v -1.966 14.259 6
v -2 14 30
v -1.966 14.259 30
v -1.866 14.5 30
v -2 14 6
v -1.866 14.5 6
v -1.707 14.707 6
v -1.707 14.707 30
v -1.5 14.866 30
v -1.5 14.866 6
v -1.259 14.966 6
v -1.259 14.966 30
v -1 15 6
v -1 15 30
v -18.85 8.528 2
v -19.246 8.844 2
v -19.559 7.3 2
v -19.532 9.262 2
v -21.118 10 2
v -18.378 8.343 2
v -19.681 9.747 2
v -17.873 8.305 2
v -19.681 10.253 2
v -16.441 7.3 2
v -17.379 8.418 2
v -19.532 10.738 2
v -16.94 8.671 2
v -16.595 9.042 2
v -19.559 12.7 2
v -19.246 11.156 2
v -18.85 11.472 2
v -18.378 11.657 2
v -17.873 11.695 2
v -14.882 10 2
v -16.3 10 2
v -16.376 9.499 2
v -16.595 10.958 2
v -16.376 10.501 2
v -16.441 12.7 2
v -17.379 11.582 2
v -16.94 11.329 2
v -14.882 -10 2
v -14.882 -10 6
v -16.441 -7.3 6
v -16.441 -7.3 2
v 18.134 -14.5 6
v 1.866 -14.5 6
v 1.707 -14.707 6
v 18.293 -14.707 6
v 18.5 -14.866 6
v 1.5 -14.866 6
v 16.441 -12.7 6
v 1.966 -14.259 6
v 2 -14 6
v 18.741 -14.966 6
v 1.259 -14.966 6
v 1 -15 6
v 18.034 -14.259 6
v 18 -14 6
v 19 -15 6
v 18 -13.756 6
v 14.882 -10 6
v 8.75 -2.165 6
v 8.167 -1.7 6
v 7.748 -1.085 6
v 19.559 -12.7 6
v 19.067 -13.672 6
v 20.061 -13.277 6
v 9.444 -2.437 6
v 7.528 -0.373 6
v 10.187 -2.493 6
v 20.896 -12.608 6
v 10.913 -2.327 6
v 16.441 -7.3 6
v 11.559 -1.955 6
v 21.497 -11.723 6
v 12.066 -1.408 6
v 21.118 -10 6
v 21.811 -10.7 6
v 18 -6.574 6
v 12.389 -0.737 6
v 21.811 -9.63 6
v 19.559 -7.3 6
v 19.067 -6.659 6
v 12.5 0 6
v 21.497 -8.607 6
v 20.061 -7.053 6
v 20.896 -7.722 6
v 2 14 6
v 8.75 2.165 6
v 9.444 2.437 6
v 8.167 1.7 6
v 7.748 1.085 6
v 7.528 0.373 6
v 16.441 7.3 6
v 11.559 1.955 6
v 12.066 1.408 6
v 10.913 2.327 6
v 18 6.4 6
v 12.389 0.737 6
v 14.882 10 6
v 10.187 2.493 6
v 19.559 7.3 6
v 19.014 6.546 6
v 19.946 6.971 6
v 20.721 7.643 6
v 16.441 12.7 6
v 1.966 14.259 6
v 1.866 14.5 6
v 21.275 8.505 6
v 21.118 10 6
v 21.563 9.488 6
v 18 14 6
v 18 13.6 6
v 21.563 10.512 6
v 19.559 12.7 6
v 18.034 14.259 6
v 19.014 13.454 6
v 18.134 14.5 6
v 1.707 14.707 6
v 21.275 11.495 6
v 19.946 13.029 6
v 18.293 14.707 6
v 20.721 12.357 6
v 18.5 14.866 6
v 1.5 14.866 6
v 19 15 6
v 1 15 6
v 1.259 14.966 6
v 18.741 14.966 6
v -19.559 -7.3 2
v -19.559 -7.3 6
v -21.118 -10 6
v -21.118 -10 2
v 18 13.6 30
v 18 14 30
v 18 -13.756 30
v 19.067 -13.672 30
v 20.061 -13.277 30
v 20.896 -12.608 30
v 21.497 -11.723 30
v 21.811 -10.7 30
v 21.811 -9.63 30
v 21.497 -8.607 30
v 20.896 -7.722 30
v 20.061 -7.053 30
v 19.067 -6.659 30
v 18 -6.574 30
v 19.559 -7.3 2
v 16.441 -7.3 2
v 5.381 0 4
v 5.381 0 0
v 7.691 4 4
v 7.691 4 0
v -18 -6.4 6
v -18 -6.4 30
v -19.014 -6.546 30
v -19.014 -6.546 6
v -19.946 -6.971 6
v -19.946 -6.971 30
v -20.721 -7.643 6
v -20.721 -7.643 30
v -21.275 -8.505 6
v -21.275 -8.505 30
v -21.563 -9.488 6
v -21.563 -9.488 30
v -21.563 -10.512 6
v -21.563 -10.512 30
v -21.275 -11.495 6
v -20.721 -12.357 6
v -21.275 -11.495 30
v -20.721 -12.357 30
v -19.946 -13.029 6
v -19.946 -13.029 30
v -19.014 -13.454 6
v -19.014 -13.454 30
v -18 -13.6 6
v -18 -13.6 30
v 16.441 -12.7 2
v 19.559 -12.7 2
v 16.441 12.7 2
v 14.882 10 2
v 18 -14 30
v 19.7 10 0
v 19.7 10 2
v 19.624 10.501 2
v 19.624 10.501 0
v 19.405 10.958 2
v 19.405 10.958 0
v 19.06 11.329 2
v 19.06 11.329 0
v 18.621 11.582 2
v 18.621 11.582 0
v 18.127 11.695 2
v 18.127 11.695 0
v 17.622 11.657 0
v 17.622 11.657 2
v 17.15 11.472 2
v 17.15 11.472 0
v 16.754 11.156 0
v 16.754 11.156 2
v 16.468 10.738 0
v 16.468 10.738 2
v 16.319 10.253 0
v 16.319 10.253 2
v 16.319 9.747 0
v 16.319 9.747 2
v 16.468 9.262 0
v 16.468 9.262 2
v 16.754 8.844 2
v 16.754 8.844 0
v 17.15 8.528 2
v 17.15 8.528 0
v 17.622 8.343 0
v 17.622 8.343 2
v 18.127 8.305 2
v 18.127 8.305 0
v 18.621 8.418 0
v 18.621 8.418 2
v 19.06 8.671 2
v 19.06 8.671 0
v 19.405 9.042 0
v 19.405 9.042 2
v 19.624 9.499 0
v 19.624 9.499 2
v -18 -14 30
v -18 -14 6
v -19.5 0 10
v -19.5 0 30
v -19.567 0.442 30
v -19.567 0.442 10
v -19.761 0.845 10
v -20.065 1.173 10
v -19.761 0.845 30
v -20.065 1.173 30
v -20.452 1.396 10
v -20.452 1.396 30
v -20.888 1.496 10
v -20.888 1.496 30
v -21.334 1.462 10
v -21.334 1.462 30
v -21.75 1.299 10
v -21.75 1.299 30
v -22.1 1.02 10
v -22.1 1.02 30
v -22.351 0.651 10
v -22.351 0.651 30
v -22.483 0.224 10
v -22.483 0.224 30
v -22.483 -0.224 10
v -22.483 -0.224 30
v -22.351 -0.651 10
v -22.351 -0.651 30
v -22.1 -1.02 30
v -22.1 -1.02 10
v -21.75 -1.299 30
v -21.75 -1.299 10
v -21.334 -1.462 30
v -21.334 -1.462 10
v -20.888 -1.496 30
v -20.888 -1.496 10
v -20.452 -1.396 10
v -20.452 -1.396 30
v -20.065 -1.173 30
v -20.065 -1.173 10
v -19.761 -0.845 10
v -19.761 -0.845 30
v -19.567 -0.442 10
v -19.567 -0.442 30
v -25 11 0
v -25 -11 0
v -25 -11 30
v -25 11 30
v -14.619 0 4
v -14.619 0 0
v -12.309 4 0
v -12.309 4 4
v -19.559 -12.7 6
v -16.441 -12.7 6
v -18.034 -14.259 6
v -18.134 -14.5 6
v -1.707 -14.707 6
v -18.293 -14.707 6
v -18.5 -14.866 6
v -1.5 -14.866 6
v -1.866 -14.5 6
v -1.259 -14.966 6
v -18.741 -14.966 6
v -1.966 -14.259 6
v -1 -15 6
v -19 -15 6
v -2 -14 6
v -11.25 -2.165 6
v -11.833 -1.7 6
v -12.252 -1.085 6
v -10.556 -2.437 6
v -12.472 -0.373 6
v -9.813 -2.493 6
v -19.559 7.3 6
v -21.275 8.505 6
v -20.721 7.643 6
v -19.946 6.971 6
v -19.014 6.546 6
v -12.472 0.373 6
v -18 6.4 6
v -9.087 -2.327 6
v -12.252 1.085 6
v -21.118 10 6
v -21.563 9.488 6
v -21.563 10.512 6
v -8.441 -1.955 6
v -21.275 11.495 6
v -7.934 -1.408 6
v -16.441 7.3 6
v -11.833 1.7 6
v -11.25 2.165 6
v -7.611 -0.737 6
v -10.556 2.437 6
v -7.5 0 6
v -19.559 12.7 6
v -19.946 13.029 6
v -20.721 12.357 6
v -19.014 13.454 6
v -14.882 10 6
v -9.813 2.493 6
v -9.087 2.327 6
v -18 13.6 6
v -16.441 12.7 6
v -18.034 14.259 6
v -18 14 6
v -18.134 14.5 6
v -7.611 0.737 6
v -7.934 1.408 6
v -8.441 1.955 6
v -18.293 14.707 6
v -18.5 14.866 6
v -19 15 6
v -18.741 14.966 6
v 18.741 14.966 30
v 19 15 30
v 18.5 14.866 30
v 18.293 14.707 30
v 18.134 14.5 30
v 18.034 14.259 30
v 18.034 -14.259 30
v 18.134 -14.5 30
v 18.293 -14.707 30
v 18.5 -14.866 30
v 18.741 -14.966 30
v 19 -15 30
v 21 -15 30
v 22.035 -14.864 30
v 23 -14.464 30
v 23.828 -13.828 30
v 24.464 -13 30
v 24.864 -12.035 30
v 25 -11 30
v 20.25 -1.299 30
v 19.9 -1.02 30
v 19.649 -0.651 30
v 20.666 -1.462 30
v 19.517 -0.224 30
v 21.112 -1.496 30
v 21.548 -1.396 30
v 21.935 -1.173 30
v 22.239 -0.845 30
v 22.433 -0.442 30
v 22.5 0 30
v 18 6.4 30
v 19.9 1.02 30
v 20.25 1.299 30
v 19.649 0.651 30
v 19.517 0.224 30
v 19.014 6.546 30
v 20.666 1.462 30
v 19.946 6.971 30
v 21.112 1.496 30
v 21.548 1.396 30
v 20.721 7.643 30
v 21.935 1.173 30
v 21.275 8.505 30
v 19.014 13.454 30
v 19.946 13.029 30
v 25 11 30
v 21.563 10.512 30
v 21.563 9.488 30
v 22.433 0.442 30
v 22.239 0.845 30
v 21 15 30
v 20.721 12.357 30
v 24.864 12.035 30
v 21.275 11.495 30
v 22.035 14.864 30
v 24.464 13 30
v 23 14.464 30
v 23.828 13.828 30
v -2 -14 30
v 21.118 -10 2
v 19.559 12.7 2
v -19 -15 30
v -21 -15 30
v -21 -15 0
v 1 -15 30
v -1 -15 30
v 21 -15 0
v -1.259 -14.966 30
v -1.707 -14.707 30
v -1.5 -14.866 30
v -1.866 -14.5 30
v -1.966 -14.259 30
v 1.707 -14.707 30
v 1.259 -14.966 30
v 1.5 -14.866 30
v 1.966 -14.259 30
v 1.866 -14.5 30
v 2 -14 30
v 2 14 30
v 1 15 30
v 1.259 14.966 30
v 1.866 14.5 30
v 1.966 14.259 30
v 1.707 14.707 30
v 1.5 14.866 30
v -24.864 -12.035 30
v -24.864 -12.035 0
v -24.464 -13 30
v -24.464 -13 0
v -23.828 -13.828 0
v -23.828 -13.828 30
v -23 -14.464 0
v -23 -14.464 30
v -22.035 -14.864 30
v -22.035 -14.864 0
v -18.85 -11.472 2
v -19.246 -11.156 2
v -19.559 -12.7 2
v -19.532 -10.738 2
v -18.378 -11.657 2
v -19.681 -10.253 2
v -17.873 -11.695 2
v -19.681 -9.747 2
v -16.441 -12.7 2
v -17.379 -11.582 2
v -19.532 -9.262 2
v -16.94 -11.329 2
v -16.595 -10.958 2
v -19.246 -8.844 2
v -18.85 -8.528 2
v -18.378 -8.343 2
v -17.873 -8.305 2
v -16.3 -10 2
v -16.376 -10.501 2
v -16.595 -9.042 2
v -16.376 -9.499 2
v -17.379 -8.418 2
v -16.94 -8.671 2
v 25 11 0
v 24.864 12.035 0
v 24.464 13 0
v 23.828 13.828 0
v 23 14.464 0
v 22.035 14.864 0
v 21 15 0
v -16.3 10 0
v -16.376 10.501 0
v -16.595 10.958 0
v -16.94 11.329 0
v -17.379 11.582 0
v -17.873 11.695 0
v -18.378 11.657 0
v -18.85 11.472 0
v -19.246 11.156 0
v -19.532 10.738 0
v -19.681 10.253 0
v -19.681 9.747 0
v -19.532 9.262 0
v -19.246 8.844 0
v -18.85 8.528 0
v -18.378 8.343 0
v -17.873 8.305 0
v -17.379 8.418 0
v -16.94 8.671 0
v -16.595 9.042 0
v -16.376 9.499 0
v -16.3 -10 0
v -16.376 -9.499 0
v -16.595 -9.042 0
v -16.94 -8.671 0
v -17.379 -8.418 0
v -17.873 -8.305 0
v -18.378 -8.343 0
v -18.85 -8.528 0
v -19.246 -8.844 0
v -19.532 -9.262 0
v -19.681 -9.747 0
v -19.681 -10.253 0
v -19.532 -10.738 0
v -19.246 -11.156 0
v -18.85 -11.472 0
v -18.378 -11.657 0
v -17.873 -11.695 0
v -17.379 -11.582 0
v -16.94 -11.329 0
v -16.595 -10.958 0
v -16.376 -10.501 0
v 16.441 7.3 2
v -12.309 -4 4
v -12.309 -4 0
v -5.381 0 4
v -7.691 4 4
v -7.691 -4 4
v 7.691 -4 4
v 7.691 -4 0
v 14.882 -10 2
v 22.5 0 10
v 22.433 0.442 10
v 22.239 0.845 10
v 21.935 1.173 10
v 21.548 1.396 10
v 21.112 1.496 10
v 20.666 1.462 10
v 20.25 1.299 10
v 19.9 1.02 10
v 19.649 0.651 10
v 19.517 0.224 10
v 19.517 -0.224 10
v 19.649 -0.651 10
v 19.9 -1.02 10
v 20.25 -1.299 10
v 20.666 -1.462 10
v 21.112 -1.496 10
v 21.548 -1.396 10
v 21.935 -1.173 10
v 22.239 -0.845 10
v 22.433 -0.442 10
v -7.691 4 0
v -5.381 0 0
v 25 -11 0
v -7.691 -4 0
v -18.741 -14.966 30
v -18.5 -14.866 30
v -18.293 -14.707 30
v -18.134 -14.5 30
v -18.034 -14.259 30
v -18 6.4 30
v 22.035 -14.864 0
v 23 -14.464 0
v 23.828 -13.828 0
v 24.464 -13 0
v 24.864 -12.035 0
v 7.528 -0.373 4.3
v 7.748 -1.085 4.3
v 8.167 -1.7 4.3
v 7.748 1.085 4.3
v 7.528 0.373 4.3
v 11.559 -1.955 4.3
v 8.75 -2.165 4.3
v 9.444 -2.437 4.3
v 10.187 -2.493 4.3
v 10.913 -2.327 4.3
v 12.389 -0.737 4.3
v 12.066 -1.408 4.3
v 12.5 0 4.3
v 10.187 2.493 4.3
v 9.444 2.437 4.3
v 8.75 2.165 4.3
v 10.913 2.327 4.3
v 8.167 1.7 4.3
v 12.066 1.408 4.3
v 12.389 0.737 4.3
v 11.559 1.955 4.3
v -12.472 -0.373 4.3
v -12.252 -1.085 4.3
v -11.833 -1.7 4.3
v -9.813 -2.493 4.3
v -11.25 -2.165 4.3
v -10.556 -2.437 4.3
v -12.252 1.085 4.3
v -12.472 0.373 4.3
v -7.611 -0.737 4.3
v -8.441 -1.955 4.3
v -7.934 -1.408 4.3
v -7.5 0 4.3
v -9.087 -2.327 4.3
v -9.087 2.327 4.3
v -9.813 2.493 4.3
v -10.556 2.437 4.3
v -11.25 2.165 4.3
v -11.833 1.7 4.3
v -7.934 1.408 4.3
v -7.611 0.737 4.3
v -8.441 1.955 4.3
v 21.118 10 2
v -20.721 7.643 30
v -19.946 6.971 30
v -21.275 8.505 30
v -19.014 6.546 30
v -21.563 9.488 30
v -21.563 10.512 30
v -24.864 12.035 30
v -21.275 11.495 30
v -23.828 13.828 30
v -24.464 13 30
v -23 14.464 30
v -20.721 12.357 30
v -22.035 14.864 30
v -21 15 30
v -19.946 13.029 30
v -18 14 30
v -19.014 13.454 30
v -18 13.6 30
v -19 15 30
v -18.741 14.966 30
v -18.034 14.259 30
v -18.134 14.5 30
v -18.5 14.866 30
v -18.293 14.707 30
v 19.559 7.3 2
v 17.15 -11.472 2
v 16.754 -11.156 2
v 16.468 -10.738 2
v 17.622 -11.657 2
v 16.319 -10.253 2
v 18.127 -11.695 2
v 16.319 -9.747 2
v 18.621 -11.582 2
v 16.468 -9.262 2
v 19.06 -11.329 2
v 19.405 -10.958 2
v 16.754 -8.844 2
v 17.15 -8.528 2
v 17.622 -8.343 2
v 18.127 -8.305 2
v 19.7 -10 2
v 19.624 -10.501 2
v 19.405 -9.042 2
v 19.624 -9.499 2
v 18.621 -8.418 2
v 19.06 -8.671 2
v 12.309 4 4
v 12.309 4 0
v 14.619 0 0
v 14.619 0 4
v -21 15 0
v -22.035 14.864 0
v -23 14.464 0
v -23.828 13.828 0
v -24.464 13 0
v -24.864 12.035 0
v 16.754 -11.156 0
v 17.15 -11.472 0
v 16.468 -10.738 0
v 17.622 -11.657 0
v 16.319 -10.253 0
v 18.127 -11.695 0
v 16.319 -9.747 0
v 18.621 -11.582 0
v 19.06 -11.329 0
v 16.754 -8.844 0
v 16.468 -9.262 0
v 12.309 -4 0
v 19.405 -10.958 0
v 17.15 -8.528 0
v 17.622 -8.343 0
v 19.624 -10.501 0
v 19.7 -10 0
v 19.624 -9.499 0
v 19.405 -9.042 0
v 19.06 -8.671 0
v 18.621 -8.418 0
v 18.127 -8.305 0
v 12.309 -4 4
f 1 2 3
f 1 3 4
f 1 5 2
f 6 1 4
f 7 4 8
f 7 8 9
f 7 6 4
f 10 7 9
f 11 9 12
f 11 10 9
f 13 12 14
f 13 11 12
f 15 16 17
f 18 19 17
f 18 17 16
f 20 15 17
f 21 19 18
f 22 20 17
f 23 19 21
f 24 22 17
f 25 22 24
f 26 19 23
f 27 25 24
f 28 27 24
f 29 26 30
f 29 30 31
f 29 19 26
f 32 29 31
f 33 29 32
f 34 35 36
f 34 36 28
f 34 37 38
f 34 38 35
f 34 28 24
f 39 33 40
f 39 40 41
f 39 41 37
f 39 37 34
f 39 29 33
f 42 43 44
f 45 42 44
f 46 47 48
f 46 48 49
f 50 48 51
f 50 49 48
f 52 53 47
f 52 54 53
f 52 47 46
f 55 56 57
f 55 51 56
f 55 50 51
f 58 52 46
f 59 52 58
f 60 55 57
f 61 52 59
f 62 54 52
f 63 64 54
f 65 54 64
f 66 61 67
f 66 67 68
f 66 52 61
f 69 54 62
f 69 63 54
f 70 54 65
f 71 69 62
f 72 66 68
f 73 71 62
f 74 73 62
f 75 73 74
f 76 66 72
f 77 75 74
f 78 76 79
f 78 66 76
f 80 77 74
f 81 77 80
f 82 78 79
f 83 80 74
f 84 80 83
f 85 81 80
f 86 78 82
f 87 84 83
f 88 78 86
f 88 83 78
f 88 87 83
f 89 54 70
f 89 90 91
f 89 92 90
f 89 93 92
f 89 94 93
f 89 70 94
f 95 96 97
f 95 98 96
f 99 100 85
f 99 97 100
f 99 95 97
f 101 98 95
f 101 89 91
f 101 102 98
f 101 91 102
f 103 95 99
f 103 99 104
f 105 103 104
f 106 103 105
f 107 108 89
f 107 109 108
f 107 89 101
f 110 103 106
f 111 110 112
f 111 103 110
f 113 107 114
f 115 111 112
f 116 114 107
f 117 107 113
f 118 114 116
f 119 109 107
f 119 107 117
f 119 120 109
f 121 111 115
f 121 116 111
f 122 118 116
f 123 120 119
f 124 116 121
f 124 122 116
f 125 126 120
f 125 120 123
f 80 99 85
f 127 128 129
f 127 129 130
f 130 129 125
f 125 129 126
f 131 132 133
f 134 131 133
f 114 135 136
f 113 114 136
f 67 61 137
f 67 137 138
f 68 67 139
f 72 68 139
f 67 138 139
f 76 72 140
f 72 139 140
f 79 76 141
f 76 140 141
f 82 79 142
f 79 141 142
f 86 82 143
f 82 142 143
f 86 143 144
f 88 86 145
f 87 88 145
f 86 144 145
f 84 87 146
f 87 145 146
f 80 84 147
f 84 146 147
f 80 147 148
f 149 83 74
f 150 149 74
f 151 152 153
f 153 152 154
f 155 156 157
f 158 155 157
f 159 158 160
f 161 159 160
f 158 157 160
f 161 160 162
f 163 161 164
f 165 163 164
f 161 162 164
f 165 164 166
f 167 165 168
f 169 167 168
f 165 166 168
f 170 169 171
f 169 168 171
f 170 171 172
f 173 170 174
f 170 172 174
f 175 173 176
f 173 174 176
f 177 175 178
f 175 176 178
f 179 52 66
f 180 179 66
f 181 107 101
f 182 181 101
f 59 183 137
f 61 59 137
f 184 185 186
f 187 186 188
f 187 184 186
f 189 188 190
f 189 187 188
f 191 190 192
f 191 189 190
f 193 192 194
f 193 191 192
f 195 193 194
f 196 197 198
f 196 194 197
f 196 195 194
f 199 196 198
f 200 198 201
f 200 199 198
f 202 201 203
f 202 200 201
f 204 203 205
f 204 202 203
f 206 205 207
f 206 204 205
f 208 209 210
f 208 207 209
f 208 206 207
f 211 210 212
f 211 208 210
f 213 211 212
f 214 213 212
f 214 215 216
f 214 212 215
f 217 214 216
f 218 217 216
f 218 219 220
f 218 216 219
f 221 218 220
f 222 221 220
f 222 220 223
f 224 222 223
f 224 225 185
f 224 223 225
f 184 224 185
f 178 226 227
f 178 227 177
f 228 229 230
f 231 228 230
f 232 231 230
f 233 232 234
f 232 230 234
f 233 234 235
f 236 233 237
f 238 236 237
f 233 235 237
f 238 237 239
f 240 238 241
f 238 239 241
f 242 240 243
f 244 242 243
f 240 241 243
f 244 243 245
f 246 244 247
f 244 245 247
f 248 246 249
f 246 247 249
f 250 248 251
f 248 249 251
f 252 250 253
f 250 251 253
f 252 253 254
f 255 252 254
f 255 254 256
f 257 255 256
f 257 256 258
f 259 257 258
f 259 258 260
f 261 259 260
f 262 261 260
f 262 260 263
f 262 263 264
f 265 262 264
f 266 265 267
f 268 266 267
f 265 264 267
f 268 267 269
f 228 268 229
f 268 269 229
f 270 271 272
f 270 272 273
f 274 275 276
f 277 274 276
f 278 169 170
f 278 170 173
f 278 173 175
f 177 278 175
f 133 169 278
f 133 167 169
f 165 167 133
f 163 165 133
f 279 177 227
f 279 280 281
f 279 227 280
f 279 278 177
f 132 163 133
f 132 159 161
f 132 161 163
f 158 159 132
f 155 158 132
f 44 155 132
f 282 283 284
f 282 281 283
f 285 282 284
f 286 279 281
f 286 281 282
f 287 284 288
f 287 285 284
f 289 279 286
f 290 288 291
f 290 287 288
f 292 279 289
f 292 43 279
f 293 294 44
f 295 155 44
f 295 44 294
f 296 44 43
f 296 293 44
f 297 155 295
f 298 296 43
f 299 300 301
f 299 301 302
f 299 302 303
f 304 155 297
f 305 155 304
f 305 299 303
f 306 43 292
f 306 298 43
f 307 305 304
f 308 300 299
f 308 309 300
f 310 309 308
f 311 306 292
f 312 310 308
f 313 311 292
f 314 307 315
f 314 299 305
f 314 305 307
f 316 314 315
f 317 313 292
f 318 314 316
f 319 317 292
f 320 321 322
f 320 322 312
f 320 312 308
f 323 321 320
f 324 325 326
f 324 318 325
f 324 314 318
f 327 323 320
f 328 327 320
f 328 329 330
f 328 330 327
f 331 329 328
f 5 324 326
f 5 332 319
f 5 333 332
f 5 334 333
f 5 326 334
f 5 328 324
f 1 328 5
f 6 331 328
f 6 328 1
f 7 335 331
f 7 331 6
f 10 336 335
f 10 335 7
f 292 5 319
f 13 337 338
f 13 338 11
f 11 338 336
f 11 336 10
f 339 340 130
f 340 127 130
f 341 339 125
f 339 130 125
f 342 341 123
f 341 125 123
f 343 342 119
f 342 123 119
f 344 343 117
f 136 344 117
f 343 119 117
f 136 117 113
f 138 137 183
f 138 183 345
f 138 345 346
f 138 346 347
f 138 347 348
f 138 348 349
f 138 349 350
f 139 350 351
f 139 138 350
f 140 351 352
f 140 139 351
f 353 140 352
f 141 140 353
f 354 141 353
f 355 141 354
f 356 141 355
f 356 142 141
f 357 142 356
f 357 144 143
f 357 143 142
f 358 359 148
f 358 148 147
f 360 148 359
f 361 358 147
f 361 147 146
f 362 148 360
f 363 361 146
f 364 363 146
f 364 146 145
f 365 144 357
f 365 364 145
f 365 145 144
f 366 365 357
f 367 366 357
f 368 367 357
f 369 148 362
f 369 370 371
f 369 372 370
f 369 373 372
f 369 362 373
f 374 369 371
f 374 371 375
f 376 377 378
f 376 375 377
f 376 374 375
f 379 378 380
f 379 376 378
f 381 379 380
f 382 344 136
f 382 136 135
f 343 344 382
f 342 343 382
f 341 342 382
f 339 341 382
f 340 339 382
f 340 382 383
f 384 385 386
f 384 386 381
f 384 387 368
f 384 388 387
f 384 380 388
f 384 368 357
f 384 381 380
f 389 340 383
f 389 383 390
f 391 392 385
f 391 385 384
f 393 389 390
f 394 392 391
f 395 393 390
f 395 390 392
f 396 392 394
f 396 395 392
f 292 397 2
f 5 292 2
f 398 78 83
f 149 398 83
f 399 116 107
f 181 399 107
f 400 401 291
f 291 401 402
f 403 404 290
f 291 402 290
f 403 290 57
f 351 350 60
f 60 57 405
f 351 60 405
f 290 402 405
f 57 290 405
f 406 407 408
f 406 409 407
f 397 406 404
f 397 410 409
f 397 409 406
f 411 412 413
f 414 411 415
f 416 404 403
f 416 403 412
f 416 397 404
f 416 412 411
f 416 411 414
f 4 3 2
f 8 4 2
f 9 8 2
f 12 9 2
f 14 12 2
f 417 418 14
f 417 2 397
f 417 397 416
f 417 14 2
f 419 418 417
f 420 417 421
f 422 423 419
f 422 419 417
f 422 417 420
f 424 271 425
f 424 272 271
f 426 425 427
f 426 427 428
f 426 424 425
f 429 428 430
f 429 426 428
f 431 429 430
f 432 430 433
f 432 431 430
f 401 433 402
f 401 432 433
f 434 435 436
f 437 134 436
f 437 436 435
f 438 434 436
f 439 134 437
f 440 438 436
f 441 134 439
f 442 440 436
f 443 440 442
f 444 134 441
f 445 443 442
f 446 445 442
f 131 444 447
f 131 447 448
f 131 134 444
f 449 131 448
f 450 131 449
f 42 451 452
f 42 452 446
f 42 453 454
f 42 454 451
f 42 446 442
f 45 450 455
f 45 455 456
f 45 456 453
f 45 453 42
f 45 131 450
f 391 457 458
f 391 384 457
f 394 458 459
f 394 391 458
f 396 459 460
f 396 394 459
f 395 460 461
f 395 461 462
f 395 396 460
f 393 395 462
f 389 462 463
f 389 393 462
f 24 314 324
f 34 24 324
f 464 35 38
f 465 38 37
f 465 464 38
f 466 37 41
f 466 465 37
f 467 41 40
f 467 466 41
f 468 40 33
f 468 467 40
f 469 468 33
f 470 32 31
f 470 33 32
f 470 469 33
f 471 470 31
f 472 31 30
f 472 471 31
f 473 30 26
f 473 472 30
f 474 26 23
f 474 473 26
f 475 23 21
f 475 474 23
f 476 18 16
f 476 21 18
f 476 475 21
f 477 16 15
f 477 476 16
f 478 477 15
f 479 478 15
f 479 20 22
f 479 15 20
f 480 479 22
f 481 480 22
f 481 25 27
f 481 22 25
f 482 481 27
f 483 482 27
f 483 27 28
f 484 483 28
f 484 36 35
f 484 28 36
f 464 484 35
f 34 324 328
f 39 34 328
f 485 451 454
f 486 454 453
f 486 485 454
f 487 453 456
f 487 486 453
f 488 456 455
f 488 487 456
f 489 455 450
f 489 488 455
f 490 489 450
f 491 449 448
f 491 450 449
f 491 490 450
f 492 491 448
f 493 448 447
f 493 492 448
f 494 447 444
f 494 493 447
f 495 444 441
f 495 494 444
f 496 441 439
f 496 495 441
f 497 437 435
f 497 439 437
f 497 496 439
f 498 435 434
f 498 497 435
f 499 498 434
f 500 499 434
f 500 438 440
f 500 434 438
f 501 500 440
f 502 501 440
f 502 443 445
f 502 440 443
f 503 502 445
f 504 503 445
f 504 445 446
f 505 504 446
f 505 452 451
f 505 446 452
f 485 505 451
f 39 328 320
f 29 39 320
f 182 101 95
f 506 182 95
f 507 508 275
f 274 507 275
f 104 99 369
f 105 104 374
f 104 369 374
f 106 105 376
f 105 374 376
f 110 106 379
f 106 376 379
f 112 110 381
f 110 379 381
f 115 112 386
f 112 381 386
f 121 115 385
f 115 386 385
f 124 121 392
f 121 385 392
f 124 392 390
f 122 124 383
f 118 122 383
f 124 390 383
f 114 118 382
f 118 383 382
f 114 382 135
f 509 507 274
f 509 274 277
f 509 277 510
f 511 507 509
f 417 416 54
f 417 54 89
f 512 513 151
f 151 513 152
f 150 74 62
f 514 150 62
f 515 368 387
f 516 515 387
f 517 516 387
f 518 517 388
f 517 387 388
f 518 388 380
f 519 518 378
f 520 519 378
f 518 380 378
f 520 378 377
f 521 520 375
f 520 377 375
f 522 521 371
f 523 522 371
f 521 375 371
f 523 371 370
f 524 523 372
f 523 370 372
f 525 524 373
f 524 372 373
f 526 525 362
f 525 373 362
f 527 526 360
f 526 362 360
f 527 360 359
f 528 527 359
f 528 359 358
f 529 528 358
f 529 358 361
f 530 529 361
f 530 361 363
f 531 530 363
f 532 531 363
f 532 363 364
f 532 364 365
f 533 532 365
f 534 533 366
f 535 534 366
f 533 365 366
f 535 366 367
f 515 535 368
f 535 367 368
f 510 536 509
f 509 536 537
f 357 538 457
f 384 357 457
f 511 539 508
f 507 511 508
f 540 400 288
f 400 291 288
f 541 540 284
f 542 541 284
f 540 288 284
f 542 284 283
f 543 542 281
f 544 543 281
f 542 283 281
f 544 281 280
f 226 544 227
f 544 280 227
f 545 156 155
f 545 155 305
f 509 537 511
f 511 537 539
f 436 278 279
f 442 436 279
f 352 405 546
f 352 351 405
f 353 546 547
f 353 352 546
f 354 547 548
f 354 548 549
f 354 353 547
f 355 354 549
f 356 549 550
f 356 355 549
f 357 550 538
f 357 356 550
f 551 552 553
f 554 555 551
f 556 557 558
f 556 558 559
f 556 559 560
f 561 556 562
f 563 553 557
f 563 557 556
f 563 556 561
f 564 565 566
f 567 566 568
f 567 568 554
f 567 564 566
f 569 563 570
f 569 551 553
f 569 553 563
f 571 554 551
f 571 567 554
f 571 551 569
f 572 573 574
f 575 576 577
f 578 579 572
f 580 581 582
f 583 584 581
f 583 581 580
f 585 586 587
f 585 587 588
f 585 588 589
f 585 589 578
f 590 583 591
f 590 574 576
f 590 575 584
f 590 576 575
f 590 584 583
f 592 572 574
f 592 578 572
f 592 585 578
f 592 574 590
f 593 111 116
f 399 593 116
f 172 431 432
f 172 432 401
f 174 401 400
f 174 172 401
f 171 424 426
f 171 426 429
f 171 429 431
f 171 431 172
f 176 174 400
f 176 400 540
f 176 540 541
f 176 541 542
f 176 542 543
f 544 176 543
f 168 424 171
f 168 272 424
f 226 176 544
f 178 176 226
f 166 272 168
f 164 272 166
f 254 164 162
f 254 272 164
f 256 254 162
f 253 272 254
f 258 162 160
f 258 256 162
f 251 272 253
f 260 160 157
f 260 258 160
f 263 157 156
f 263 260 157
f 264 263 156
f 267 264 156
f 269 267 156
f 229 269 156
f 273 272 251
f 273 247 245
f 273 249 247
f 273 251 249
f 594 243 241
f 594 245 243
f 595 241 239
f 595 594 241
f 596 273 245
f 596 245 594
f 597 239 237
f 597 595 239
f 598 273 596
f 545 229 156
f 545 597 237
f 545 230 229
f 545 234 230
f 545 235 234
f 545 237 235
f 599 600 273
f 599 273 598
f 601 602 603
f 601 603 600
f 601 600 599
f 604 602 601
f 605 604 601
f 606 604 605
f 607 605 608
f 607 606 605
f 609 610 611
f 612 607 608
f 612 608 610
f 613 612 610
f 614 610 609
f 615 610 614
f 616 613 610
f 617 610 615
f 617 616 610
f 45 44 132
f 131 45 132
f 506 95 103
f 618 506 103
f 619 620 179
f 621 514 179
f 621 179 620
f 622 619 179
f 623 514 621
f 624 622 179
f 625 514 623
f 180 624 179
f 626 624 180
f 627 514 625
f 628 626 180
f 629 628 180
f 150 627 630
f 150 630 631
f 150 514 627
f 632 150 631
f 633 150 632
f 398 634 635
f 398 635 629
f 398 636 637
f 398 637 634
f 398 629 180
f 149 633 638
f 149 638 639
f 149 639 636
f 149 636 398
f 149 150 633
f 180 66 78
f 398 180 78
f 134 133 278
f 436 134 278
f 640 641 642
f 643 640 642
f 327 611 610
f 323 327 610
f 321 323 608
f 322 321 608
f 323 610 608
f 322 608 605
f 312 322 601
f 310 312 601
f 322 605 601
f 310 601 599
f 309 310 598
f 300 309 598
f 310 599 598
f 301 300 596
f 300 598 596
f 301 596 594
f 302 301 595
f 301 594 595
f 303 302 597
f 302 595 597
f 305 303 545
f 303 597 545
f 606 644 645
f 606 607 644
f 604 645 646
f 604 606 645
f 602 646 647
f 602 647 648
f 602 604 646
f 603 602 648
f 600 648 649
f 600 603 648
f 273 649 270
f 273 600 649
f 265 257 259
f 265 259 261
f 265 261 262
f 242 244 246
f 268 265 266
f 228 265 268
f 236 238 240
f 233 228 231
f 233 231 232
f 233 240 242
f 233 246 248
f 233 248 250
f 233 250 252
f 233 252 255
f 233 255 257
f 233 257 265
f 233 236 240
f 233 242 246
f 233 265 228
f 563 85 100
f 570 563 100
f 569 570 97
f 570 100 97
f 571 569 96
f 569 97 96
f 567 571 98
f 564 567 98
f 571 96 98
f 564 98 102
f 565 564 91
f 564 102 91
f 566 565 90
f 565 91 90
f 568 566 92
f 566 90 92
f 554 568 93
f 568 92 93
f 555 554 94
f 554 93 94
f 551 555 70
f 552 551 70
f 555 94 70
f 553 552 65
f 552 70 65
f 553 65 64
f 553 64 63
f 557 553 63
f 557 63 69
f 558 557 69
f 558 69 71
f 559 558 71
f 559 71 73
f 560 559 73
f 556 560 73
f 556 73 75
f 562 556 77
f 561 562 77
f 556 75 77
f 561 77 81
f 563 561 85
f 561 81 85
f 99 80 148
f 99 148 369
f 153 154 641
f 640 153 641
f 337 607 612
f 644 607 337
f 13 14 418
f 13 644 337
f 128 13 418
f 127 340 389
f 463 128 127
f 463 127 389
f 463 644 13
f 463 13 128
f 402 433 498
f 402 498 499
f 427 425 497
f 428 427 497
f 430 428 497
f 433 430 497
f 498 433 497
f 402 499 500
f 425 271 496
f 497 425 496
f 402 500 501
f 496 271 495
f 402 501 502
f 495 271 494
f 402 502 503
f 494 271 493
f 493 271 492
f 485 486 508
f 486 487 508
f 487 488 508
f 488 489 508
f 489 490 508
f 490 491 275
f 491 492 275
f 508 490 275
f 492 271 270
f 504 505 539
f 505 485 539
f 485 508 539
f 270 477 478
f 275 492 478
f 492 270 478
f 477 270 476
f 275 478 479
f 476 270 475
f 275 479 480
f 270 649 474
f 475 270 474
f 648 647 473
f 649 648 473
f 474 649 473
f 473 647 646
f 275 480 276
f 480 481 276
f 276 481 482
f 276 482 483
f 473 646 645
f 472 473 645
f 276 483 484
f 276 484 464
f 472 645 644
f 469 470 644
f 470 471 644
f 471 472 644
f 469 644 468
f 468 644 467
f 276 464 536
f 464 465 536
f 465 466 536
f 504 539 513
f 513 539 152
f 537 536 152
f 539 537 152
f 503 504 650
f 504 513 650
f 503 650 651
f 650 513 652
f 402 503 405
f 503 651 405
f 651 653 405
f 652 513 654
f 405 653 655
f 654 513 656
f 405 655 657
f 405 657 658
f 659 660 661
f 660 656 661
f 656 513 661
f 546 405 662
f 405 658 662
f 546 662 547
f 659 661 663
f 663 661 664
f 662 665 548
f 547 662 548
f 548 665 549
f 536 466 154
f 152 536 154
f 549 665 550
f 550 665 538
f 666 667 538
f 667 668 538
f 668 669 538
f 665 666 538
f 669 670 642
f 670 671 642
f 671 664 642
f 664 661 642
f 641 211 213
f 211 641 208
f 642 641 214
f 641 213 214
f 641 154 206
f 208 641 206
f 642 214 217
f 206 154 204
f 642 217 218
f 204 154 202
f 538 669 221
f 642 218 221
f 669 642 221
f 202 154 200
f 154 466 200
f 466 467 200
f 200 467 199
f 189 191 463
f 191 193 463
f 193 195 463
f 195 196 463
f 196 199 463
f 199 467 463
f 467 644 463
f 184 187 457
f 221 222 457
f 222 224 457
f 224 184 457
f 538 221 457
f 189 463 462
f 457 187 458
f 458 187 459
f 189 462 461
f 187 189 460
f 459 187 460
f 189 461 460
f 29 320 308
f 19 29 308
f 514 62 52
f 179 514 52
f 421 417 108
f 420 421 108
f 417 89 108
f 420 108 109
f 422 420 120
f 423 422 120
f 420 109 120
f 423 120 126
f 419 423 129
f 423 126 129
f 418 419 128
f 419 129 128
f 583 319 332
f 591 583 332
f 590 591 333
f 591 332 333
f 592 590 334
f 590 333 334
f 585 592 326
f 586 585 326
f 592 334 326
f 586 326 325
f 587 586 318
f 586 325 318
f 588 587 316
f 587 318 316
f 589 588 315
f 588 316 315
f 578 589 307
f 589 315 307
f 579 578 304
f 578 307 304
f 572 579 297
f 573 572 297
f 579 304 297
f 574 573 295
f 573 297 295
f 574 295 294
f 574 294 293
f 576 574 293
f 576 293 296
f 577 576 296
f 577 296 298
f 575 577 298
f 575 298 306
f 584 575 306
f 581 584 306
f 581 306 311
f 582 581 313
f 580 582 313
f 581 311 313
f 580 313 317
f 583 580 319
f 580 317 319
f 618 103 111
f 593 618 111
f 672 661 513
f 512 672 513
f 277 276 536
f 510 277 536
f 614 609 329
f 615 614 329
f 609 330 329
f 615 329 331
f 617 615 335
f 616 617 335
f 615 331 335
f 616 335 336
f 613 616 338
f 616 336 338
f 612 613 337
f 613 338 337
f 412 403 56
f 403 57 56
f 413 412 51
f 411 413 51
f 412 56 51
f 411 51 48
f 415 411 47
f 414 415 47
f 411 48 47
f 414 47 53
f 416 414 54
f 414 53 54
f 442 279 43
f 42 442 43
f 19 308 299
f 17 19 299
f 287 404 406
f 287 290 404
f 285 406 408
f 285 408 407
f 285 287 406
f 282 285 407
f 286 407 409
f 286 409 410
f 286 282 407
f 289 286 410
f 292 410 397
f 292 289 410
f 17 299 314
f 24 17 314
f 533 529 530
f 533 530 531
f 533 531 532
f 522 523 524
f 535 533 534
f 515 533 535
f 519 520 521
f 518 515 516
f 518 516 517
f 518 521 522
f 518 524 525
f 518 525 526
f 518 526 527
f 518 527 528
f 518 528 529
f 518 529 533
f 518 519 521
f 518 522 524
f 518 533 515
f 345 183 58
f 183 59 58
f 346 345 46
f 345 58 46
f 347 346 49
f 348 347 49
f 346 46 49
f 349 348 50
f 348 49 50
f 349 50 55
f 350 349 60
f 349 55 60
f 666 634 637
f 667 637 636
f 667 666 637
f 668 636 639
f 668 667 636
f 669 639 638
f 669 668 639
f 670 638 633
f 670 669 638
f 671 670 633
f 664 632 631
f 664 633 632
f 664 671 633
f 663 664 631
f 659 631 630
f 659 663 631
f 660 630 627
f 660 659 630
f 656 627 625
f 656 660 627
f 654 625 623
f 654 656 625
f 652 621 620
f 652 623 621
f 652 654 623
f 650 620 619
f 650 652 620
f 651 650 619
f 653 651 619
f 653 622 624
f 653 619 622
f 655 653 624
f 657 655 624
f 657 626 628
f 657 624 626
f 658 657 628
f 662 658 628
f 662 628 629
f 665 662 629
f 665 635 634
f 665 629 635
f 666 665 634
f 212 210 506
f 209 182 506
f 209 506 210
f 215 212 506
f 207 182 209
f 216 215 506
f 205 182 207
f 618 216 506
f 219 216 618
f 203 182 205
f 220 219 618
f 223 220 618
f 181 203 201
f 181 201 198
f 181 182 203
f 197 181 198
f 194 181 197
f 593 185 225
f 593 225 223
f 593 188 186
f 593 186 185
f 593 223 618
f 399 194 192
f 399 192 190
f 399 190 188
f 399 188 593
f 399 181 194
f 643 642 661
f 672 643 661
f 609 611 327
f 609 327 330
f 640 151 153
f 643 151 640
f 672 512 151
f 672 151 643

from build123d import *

# Parameters (mm, degrees)
SKETCH_W        = 50
SKETCH_H        = 30
SKETCH_R        = 1.7
PAD_DEPTH       = 30
SKETCH001_W     = 16
SKETCH001_H     = 35
POCKET_DEPTH    = 24
POCKET001_DEPTH = 4
SKETCH003_R     = 2.5
POCKET002_DEPTH = 1.7
SKETCH004_R     = 3.6
POCKET003_DEPTH = 24
POCKET004_DEPTH = 4
SKETCH006_R     = 1.5
POCKET005_DEPTH = 20
FILLET_R        = 4
FILLET001_R     = 4
FILLET002_R     = 4
FILLET003_R     = 4
FILLET004_R     = 1
FILLET005_R     = 1
FILLET006_R     = 1
FILLET007_R     = 1
FILLET008_R     = 1
FILLET009_R     = 1
FILLET010_R     = 1
FILLET011_R     = 1


with BuildPart() as part:
    # Sketch → Pad (new body)
    with BuildSketch(Plane.XY):
        Rectangle(SKETCH_W, SKETCH_H)
        with Locations((18, 10)):
            Circle(SKETCH_R, mode=Mode.SUBTRACT)
        with Locations((18, -10)):
            Circle(SKETCH_R, mode=Mode.SUBTRACT)
        with Locations((-18, -10)):
            Circle(SKETCH_R, mode=Mode.SUBTRACT)
        with Locations((-18, 10)):
            Circle(SKETCH_R, mode=Mode.SUBTRACT)
    extrude(amount=PAD_DEPTH)

    # Sketch001 → Pocket (cut)
    with BuildSketch(Plane.XY.offset(30)):
        with Locations((-10, 0)):
            Rectangle(SKETCH001_W, SKETCH001_H)
        with Locations((10, 0)):
            Rectangle(SKETCH001_W, SKETCH001_H)
    extrude(amount=-POCKET_DEPTH, mode=Mode.SUBTRACT)

    # Sketch002 → Pocket001 (cut)
    with BuildSketch(Plane(origin=(0, 0, 0), x_dir=(1, 0, 0), z_dir=(0, 0, -1))):
        Polygon((-12.309401, 4), (-14.618802, 0), (-12.309401, -4), (-7.690599, -4), (-5.381198, 0), (-7.690599, 4), align=None)
        Polygon((7.690599, 4), (5.381198, 0), (7.690599, -4), (12.309401, -4), (14.618802, 0), (12.309401, 4), align=None)
    extrude(amount=-POCKET001_DEPTH, mode=Mode.SUBTRACT)

    # Sketch003 → Pocket002 (cut)
    with BuildSketch(Plane.XY.offset(6)):
        with Locations((-10, 0)):
            Circle(SKETCH003_R)
        with Locations((10, 0)):
            Circle(SKETCH003_R)
    extrude(amount=-POCKET002_DEPTH, mode=Mode.SUBTRACT)

    # Sketch004 → Pocket003 (cut)
    with BuildSketch(Plane.XY.offset(30)):
        with Locations((-18, 10)):
            Circle(SKETCH004_R)
        with Locations((18, 10)):
            Circle(SKETCH004_R)
        with Locations((-18, -10)):
            Circle(SKETCH004_R)
        with Locations((18.251301, -10.165039)):
            Circle(SKETCH004_R)
    extrude(amount=-POCKET003_DEPTH, mode=Mode.SUBTRACT)

    # Sketch005 → Pocket004 (cut)
    with BuildSketch(Plane.XY.offset(6)):
        Polygon((-19.558846, 12.7), (-21.117691, 10), (-19.558846, 7.3), (-16.441154, 7.3), (-14.882309, 10), (-16.441154, 12.7), align=None)
        Polygon((16.441154, 12.7), (14.882309, 10), (16.441154, 7.3), (19.558846, 7.3), (21.117691, 10), (19.558846, 12.7), align=None)
        Polygon((16.441154, -7.3), (14.882309, -10), (16.441154, -12.7), (19.558846, -12.7), (21.117691, -10), (19.558846, -7.3), align=None)
        Polygon((-21.117691, -10), (-19.558846, -12.7), (-16.441154, -12.7), (-14.882309, -10), (-16.441154, -7.3), (-19.558846, -7.3), align=None)
    extrude(amount=-POCKET004_DEPTH, mode=Mode.SUBTRACT)

    # Sketch006 → Pocket005 (cut)
    with BuildSketch(Plane.XY.offset(30)):
        with Locations((-21, 0)):
            Circle(SKETCH006_R)
        with Locations((21, 0)):
            Circle(SKETCH006_R)
    extrude(amount=-POCKET005_DEPTH, mode=Mode.SUBTRACT)

    # Fillet
    fillet_edges = [part.edges().sort_by_distance(p)[0] for p in [
        (-25, -15, 15),
    ]]
    fillet(fillet_edges, radius=FILLET_R)

    # Fillet001
    fillet001_edges = [part.edges().sort_by_distance(p)[0] for p in [
        (25, -15, 15),
    ]]
    fillet(fillet001_edges, radius=FILLET001_R)

    # Fillet002
    fillet002_edges = [part.edges().sort_by_distance(p)[0] for p in [
        (25, 15, 15),
    ]]
    fillet(fillet002_edges, radius=FILLET002_R)

    # Fillet003
    fillet003_edges = [part.edges().sort_by_distance(p)[0] for p in [
        (-25, 15, 15),
    ]]
    fillet(fillet003_edges, radius=FILLET003_R)

    # Fillet004
    fillet004_edges = [part.edges().sort_by_distance(p)[0] for p in [
        (-2, -15, 18),
    ]]
    fillet(fillet004_edges, radius=FILLET004_R)

    # Fillet005
    fillet005_edges = [part.edges().sort_by_distance(p)[0] for p in [
        (2, -15, 18),
    ]]
    fillet(fillet005_edges, radius=FILLET005_R)

    # Fillet006
    fillet006_edges = [part.edges().sort_by_distance(p)[0] for p in [
        (-2, 15, 18),
    ]]
    fillet(fillet006_edges, radius=FILLET006_R)

    # Fillet007
    fillet007_edges = [part.edges().sort_by_distance(p)[0] for p in [
        (2, 15, 18),
    ]]
    fillet(fillet007_edges, radius=FILLET007_R)

    # Fillet008
    fillet008_edges = [part.edges().sort_by_distance(p)[0] for p in [
        (18, 15, 18),
    ]]
    fillet(fillet008_edges, radius=FILLET008_R)

    # Fillet009
    fillet009_edges = [part.edges().sort_by_distance(p)[0] for p in [
        (-18, 15, 18),
    ]]
    fillet(fillet009_edges, radius=FILLET009_R)

    # Fillet010
    fillet010_edges = [part.edges().sort_by_distance(p)[0] for p in [
        (-18, -15, 18),
    ]]
    fillet(fillet010_edges, radius=FILLET010_R)

    # Fillet011
    fillet011_edges = [part.edges().sort_by_distance(p)[0] for p in [
        (18, -15, 18),
    ]]
    fillet(fillet011_edges, radius=FILLET011_R)


solid = part.part
